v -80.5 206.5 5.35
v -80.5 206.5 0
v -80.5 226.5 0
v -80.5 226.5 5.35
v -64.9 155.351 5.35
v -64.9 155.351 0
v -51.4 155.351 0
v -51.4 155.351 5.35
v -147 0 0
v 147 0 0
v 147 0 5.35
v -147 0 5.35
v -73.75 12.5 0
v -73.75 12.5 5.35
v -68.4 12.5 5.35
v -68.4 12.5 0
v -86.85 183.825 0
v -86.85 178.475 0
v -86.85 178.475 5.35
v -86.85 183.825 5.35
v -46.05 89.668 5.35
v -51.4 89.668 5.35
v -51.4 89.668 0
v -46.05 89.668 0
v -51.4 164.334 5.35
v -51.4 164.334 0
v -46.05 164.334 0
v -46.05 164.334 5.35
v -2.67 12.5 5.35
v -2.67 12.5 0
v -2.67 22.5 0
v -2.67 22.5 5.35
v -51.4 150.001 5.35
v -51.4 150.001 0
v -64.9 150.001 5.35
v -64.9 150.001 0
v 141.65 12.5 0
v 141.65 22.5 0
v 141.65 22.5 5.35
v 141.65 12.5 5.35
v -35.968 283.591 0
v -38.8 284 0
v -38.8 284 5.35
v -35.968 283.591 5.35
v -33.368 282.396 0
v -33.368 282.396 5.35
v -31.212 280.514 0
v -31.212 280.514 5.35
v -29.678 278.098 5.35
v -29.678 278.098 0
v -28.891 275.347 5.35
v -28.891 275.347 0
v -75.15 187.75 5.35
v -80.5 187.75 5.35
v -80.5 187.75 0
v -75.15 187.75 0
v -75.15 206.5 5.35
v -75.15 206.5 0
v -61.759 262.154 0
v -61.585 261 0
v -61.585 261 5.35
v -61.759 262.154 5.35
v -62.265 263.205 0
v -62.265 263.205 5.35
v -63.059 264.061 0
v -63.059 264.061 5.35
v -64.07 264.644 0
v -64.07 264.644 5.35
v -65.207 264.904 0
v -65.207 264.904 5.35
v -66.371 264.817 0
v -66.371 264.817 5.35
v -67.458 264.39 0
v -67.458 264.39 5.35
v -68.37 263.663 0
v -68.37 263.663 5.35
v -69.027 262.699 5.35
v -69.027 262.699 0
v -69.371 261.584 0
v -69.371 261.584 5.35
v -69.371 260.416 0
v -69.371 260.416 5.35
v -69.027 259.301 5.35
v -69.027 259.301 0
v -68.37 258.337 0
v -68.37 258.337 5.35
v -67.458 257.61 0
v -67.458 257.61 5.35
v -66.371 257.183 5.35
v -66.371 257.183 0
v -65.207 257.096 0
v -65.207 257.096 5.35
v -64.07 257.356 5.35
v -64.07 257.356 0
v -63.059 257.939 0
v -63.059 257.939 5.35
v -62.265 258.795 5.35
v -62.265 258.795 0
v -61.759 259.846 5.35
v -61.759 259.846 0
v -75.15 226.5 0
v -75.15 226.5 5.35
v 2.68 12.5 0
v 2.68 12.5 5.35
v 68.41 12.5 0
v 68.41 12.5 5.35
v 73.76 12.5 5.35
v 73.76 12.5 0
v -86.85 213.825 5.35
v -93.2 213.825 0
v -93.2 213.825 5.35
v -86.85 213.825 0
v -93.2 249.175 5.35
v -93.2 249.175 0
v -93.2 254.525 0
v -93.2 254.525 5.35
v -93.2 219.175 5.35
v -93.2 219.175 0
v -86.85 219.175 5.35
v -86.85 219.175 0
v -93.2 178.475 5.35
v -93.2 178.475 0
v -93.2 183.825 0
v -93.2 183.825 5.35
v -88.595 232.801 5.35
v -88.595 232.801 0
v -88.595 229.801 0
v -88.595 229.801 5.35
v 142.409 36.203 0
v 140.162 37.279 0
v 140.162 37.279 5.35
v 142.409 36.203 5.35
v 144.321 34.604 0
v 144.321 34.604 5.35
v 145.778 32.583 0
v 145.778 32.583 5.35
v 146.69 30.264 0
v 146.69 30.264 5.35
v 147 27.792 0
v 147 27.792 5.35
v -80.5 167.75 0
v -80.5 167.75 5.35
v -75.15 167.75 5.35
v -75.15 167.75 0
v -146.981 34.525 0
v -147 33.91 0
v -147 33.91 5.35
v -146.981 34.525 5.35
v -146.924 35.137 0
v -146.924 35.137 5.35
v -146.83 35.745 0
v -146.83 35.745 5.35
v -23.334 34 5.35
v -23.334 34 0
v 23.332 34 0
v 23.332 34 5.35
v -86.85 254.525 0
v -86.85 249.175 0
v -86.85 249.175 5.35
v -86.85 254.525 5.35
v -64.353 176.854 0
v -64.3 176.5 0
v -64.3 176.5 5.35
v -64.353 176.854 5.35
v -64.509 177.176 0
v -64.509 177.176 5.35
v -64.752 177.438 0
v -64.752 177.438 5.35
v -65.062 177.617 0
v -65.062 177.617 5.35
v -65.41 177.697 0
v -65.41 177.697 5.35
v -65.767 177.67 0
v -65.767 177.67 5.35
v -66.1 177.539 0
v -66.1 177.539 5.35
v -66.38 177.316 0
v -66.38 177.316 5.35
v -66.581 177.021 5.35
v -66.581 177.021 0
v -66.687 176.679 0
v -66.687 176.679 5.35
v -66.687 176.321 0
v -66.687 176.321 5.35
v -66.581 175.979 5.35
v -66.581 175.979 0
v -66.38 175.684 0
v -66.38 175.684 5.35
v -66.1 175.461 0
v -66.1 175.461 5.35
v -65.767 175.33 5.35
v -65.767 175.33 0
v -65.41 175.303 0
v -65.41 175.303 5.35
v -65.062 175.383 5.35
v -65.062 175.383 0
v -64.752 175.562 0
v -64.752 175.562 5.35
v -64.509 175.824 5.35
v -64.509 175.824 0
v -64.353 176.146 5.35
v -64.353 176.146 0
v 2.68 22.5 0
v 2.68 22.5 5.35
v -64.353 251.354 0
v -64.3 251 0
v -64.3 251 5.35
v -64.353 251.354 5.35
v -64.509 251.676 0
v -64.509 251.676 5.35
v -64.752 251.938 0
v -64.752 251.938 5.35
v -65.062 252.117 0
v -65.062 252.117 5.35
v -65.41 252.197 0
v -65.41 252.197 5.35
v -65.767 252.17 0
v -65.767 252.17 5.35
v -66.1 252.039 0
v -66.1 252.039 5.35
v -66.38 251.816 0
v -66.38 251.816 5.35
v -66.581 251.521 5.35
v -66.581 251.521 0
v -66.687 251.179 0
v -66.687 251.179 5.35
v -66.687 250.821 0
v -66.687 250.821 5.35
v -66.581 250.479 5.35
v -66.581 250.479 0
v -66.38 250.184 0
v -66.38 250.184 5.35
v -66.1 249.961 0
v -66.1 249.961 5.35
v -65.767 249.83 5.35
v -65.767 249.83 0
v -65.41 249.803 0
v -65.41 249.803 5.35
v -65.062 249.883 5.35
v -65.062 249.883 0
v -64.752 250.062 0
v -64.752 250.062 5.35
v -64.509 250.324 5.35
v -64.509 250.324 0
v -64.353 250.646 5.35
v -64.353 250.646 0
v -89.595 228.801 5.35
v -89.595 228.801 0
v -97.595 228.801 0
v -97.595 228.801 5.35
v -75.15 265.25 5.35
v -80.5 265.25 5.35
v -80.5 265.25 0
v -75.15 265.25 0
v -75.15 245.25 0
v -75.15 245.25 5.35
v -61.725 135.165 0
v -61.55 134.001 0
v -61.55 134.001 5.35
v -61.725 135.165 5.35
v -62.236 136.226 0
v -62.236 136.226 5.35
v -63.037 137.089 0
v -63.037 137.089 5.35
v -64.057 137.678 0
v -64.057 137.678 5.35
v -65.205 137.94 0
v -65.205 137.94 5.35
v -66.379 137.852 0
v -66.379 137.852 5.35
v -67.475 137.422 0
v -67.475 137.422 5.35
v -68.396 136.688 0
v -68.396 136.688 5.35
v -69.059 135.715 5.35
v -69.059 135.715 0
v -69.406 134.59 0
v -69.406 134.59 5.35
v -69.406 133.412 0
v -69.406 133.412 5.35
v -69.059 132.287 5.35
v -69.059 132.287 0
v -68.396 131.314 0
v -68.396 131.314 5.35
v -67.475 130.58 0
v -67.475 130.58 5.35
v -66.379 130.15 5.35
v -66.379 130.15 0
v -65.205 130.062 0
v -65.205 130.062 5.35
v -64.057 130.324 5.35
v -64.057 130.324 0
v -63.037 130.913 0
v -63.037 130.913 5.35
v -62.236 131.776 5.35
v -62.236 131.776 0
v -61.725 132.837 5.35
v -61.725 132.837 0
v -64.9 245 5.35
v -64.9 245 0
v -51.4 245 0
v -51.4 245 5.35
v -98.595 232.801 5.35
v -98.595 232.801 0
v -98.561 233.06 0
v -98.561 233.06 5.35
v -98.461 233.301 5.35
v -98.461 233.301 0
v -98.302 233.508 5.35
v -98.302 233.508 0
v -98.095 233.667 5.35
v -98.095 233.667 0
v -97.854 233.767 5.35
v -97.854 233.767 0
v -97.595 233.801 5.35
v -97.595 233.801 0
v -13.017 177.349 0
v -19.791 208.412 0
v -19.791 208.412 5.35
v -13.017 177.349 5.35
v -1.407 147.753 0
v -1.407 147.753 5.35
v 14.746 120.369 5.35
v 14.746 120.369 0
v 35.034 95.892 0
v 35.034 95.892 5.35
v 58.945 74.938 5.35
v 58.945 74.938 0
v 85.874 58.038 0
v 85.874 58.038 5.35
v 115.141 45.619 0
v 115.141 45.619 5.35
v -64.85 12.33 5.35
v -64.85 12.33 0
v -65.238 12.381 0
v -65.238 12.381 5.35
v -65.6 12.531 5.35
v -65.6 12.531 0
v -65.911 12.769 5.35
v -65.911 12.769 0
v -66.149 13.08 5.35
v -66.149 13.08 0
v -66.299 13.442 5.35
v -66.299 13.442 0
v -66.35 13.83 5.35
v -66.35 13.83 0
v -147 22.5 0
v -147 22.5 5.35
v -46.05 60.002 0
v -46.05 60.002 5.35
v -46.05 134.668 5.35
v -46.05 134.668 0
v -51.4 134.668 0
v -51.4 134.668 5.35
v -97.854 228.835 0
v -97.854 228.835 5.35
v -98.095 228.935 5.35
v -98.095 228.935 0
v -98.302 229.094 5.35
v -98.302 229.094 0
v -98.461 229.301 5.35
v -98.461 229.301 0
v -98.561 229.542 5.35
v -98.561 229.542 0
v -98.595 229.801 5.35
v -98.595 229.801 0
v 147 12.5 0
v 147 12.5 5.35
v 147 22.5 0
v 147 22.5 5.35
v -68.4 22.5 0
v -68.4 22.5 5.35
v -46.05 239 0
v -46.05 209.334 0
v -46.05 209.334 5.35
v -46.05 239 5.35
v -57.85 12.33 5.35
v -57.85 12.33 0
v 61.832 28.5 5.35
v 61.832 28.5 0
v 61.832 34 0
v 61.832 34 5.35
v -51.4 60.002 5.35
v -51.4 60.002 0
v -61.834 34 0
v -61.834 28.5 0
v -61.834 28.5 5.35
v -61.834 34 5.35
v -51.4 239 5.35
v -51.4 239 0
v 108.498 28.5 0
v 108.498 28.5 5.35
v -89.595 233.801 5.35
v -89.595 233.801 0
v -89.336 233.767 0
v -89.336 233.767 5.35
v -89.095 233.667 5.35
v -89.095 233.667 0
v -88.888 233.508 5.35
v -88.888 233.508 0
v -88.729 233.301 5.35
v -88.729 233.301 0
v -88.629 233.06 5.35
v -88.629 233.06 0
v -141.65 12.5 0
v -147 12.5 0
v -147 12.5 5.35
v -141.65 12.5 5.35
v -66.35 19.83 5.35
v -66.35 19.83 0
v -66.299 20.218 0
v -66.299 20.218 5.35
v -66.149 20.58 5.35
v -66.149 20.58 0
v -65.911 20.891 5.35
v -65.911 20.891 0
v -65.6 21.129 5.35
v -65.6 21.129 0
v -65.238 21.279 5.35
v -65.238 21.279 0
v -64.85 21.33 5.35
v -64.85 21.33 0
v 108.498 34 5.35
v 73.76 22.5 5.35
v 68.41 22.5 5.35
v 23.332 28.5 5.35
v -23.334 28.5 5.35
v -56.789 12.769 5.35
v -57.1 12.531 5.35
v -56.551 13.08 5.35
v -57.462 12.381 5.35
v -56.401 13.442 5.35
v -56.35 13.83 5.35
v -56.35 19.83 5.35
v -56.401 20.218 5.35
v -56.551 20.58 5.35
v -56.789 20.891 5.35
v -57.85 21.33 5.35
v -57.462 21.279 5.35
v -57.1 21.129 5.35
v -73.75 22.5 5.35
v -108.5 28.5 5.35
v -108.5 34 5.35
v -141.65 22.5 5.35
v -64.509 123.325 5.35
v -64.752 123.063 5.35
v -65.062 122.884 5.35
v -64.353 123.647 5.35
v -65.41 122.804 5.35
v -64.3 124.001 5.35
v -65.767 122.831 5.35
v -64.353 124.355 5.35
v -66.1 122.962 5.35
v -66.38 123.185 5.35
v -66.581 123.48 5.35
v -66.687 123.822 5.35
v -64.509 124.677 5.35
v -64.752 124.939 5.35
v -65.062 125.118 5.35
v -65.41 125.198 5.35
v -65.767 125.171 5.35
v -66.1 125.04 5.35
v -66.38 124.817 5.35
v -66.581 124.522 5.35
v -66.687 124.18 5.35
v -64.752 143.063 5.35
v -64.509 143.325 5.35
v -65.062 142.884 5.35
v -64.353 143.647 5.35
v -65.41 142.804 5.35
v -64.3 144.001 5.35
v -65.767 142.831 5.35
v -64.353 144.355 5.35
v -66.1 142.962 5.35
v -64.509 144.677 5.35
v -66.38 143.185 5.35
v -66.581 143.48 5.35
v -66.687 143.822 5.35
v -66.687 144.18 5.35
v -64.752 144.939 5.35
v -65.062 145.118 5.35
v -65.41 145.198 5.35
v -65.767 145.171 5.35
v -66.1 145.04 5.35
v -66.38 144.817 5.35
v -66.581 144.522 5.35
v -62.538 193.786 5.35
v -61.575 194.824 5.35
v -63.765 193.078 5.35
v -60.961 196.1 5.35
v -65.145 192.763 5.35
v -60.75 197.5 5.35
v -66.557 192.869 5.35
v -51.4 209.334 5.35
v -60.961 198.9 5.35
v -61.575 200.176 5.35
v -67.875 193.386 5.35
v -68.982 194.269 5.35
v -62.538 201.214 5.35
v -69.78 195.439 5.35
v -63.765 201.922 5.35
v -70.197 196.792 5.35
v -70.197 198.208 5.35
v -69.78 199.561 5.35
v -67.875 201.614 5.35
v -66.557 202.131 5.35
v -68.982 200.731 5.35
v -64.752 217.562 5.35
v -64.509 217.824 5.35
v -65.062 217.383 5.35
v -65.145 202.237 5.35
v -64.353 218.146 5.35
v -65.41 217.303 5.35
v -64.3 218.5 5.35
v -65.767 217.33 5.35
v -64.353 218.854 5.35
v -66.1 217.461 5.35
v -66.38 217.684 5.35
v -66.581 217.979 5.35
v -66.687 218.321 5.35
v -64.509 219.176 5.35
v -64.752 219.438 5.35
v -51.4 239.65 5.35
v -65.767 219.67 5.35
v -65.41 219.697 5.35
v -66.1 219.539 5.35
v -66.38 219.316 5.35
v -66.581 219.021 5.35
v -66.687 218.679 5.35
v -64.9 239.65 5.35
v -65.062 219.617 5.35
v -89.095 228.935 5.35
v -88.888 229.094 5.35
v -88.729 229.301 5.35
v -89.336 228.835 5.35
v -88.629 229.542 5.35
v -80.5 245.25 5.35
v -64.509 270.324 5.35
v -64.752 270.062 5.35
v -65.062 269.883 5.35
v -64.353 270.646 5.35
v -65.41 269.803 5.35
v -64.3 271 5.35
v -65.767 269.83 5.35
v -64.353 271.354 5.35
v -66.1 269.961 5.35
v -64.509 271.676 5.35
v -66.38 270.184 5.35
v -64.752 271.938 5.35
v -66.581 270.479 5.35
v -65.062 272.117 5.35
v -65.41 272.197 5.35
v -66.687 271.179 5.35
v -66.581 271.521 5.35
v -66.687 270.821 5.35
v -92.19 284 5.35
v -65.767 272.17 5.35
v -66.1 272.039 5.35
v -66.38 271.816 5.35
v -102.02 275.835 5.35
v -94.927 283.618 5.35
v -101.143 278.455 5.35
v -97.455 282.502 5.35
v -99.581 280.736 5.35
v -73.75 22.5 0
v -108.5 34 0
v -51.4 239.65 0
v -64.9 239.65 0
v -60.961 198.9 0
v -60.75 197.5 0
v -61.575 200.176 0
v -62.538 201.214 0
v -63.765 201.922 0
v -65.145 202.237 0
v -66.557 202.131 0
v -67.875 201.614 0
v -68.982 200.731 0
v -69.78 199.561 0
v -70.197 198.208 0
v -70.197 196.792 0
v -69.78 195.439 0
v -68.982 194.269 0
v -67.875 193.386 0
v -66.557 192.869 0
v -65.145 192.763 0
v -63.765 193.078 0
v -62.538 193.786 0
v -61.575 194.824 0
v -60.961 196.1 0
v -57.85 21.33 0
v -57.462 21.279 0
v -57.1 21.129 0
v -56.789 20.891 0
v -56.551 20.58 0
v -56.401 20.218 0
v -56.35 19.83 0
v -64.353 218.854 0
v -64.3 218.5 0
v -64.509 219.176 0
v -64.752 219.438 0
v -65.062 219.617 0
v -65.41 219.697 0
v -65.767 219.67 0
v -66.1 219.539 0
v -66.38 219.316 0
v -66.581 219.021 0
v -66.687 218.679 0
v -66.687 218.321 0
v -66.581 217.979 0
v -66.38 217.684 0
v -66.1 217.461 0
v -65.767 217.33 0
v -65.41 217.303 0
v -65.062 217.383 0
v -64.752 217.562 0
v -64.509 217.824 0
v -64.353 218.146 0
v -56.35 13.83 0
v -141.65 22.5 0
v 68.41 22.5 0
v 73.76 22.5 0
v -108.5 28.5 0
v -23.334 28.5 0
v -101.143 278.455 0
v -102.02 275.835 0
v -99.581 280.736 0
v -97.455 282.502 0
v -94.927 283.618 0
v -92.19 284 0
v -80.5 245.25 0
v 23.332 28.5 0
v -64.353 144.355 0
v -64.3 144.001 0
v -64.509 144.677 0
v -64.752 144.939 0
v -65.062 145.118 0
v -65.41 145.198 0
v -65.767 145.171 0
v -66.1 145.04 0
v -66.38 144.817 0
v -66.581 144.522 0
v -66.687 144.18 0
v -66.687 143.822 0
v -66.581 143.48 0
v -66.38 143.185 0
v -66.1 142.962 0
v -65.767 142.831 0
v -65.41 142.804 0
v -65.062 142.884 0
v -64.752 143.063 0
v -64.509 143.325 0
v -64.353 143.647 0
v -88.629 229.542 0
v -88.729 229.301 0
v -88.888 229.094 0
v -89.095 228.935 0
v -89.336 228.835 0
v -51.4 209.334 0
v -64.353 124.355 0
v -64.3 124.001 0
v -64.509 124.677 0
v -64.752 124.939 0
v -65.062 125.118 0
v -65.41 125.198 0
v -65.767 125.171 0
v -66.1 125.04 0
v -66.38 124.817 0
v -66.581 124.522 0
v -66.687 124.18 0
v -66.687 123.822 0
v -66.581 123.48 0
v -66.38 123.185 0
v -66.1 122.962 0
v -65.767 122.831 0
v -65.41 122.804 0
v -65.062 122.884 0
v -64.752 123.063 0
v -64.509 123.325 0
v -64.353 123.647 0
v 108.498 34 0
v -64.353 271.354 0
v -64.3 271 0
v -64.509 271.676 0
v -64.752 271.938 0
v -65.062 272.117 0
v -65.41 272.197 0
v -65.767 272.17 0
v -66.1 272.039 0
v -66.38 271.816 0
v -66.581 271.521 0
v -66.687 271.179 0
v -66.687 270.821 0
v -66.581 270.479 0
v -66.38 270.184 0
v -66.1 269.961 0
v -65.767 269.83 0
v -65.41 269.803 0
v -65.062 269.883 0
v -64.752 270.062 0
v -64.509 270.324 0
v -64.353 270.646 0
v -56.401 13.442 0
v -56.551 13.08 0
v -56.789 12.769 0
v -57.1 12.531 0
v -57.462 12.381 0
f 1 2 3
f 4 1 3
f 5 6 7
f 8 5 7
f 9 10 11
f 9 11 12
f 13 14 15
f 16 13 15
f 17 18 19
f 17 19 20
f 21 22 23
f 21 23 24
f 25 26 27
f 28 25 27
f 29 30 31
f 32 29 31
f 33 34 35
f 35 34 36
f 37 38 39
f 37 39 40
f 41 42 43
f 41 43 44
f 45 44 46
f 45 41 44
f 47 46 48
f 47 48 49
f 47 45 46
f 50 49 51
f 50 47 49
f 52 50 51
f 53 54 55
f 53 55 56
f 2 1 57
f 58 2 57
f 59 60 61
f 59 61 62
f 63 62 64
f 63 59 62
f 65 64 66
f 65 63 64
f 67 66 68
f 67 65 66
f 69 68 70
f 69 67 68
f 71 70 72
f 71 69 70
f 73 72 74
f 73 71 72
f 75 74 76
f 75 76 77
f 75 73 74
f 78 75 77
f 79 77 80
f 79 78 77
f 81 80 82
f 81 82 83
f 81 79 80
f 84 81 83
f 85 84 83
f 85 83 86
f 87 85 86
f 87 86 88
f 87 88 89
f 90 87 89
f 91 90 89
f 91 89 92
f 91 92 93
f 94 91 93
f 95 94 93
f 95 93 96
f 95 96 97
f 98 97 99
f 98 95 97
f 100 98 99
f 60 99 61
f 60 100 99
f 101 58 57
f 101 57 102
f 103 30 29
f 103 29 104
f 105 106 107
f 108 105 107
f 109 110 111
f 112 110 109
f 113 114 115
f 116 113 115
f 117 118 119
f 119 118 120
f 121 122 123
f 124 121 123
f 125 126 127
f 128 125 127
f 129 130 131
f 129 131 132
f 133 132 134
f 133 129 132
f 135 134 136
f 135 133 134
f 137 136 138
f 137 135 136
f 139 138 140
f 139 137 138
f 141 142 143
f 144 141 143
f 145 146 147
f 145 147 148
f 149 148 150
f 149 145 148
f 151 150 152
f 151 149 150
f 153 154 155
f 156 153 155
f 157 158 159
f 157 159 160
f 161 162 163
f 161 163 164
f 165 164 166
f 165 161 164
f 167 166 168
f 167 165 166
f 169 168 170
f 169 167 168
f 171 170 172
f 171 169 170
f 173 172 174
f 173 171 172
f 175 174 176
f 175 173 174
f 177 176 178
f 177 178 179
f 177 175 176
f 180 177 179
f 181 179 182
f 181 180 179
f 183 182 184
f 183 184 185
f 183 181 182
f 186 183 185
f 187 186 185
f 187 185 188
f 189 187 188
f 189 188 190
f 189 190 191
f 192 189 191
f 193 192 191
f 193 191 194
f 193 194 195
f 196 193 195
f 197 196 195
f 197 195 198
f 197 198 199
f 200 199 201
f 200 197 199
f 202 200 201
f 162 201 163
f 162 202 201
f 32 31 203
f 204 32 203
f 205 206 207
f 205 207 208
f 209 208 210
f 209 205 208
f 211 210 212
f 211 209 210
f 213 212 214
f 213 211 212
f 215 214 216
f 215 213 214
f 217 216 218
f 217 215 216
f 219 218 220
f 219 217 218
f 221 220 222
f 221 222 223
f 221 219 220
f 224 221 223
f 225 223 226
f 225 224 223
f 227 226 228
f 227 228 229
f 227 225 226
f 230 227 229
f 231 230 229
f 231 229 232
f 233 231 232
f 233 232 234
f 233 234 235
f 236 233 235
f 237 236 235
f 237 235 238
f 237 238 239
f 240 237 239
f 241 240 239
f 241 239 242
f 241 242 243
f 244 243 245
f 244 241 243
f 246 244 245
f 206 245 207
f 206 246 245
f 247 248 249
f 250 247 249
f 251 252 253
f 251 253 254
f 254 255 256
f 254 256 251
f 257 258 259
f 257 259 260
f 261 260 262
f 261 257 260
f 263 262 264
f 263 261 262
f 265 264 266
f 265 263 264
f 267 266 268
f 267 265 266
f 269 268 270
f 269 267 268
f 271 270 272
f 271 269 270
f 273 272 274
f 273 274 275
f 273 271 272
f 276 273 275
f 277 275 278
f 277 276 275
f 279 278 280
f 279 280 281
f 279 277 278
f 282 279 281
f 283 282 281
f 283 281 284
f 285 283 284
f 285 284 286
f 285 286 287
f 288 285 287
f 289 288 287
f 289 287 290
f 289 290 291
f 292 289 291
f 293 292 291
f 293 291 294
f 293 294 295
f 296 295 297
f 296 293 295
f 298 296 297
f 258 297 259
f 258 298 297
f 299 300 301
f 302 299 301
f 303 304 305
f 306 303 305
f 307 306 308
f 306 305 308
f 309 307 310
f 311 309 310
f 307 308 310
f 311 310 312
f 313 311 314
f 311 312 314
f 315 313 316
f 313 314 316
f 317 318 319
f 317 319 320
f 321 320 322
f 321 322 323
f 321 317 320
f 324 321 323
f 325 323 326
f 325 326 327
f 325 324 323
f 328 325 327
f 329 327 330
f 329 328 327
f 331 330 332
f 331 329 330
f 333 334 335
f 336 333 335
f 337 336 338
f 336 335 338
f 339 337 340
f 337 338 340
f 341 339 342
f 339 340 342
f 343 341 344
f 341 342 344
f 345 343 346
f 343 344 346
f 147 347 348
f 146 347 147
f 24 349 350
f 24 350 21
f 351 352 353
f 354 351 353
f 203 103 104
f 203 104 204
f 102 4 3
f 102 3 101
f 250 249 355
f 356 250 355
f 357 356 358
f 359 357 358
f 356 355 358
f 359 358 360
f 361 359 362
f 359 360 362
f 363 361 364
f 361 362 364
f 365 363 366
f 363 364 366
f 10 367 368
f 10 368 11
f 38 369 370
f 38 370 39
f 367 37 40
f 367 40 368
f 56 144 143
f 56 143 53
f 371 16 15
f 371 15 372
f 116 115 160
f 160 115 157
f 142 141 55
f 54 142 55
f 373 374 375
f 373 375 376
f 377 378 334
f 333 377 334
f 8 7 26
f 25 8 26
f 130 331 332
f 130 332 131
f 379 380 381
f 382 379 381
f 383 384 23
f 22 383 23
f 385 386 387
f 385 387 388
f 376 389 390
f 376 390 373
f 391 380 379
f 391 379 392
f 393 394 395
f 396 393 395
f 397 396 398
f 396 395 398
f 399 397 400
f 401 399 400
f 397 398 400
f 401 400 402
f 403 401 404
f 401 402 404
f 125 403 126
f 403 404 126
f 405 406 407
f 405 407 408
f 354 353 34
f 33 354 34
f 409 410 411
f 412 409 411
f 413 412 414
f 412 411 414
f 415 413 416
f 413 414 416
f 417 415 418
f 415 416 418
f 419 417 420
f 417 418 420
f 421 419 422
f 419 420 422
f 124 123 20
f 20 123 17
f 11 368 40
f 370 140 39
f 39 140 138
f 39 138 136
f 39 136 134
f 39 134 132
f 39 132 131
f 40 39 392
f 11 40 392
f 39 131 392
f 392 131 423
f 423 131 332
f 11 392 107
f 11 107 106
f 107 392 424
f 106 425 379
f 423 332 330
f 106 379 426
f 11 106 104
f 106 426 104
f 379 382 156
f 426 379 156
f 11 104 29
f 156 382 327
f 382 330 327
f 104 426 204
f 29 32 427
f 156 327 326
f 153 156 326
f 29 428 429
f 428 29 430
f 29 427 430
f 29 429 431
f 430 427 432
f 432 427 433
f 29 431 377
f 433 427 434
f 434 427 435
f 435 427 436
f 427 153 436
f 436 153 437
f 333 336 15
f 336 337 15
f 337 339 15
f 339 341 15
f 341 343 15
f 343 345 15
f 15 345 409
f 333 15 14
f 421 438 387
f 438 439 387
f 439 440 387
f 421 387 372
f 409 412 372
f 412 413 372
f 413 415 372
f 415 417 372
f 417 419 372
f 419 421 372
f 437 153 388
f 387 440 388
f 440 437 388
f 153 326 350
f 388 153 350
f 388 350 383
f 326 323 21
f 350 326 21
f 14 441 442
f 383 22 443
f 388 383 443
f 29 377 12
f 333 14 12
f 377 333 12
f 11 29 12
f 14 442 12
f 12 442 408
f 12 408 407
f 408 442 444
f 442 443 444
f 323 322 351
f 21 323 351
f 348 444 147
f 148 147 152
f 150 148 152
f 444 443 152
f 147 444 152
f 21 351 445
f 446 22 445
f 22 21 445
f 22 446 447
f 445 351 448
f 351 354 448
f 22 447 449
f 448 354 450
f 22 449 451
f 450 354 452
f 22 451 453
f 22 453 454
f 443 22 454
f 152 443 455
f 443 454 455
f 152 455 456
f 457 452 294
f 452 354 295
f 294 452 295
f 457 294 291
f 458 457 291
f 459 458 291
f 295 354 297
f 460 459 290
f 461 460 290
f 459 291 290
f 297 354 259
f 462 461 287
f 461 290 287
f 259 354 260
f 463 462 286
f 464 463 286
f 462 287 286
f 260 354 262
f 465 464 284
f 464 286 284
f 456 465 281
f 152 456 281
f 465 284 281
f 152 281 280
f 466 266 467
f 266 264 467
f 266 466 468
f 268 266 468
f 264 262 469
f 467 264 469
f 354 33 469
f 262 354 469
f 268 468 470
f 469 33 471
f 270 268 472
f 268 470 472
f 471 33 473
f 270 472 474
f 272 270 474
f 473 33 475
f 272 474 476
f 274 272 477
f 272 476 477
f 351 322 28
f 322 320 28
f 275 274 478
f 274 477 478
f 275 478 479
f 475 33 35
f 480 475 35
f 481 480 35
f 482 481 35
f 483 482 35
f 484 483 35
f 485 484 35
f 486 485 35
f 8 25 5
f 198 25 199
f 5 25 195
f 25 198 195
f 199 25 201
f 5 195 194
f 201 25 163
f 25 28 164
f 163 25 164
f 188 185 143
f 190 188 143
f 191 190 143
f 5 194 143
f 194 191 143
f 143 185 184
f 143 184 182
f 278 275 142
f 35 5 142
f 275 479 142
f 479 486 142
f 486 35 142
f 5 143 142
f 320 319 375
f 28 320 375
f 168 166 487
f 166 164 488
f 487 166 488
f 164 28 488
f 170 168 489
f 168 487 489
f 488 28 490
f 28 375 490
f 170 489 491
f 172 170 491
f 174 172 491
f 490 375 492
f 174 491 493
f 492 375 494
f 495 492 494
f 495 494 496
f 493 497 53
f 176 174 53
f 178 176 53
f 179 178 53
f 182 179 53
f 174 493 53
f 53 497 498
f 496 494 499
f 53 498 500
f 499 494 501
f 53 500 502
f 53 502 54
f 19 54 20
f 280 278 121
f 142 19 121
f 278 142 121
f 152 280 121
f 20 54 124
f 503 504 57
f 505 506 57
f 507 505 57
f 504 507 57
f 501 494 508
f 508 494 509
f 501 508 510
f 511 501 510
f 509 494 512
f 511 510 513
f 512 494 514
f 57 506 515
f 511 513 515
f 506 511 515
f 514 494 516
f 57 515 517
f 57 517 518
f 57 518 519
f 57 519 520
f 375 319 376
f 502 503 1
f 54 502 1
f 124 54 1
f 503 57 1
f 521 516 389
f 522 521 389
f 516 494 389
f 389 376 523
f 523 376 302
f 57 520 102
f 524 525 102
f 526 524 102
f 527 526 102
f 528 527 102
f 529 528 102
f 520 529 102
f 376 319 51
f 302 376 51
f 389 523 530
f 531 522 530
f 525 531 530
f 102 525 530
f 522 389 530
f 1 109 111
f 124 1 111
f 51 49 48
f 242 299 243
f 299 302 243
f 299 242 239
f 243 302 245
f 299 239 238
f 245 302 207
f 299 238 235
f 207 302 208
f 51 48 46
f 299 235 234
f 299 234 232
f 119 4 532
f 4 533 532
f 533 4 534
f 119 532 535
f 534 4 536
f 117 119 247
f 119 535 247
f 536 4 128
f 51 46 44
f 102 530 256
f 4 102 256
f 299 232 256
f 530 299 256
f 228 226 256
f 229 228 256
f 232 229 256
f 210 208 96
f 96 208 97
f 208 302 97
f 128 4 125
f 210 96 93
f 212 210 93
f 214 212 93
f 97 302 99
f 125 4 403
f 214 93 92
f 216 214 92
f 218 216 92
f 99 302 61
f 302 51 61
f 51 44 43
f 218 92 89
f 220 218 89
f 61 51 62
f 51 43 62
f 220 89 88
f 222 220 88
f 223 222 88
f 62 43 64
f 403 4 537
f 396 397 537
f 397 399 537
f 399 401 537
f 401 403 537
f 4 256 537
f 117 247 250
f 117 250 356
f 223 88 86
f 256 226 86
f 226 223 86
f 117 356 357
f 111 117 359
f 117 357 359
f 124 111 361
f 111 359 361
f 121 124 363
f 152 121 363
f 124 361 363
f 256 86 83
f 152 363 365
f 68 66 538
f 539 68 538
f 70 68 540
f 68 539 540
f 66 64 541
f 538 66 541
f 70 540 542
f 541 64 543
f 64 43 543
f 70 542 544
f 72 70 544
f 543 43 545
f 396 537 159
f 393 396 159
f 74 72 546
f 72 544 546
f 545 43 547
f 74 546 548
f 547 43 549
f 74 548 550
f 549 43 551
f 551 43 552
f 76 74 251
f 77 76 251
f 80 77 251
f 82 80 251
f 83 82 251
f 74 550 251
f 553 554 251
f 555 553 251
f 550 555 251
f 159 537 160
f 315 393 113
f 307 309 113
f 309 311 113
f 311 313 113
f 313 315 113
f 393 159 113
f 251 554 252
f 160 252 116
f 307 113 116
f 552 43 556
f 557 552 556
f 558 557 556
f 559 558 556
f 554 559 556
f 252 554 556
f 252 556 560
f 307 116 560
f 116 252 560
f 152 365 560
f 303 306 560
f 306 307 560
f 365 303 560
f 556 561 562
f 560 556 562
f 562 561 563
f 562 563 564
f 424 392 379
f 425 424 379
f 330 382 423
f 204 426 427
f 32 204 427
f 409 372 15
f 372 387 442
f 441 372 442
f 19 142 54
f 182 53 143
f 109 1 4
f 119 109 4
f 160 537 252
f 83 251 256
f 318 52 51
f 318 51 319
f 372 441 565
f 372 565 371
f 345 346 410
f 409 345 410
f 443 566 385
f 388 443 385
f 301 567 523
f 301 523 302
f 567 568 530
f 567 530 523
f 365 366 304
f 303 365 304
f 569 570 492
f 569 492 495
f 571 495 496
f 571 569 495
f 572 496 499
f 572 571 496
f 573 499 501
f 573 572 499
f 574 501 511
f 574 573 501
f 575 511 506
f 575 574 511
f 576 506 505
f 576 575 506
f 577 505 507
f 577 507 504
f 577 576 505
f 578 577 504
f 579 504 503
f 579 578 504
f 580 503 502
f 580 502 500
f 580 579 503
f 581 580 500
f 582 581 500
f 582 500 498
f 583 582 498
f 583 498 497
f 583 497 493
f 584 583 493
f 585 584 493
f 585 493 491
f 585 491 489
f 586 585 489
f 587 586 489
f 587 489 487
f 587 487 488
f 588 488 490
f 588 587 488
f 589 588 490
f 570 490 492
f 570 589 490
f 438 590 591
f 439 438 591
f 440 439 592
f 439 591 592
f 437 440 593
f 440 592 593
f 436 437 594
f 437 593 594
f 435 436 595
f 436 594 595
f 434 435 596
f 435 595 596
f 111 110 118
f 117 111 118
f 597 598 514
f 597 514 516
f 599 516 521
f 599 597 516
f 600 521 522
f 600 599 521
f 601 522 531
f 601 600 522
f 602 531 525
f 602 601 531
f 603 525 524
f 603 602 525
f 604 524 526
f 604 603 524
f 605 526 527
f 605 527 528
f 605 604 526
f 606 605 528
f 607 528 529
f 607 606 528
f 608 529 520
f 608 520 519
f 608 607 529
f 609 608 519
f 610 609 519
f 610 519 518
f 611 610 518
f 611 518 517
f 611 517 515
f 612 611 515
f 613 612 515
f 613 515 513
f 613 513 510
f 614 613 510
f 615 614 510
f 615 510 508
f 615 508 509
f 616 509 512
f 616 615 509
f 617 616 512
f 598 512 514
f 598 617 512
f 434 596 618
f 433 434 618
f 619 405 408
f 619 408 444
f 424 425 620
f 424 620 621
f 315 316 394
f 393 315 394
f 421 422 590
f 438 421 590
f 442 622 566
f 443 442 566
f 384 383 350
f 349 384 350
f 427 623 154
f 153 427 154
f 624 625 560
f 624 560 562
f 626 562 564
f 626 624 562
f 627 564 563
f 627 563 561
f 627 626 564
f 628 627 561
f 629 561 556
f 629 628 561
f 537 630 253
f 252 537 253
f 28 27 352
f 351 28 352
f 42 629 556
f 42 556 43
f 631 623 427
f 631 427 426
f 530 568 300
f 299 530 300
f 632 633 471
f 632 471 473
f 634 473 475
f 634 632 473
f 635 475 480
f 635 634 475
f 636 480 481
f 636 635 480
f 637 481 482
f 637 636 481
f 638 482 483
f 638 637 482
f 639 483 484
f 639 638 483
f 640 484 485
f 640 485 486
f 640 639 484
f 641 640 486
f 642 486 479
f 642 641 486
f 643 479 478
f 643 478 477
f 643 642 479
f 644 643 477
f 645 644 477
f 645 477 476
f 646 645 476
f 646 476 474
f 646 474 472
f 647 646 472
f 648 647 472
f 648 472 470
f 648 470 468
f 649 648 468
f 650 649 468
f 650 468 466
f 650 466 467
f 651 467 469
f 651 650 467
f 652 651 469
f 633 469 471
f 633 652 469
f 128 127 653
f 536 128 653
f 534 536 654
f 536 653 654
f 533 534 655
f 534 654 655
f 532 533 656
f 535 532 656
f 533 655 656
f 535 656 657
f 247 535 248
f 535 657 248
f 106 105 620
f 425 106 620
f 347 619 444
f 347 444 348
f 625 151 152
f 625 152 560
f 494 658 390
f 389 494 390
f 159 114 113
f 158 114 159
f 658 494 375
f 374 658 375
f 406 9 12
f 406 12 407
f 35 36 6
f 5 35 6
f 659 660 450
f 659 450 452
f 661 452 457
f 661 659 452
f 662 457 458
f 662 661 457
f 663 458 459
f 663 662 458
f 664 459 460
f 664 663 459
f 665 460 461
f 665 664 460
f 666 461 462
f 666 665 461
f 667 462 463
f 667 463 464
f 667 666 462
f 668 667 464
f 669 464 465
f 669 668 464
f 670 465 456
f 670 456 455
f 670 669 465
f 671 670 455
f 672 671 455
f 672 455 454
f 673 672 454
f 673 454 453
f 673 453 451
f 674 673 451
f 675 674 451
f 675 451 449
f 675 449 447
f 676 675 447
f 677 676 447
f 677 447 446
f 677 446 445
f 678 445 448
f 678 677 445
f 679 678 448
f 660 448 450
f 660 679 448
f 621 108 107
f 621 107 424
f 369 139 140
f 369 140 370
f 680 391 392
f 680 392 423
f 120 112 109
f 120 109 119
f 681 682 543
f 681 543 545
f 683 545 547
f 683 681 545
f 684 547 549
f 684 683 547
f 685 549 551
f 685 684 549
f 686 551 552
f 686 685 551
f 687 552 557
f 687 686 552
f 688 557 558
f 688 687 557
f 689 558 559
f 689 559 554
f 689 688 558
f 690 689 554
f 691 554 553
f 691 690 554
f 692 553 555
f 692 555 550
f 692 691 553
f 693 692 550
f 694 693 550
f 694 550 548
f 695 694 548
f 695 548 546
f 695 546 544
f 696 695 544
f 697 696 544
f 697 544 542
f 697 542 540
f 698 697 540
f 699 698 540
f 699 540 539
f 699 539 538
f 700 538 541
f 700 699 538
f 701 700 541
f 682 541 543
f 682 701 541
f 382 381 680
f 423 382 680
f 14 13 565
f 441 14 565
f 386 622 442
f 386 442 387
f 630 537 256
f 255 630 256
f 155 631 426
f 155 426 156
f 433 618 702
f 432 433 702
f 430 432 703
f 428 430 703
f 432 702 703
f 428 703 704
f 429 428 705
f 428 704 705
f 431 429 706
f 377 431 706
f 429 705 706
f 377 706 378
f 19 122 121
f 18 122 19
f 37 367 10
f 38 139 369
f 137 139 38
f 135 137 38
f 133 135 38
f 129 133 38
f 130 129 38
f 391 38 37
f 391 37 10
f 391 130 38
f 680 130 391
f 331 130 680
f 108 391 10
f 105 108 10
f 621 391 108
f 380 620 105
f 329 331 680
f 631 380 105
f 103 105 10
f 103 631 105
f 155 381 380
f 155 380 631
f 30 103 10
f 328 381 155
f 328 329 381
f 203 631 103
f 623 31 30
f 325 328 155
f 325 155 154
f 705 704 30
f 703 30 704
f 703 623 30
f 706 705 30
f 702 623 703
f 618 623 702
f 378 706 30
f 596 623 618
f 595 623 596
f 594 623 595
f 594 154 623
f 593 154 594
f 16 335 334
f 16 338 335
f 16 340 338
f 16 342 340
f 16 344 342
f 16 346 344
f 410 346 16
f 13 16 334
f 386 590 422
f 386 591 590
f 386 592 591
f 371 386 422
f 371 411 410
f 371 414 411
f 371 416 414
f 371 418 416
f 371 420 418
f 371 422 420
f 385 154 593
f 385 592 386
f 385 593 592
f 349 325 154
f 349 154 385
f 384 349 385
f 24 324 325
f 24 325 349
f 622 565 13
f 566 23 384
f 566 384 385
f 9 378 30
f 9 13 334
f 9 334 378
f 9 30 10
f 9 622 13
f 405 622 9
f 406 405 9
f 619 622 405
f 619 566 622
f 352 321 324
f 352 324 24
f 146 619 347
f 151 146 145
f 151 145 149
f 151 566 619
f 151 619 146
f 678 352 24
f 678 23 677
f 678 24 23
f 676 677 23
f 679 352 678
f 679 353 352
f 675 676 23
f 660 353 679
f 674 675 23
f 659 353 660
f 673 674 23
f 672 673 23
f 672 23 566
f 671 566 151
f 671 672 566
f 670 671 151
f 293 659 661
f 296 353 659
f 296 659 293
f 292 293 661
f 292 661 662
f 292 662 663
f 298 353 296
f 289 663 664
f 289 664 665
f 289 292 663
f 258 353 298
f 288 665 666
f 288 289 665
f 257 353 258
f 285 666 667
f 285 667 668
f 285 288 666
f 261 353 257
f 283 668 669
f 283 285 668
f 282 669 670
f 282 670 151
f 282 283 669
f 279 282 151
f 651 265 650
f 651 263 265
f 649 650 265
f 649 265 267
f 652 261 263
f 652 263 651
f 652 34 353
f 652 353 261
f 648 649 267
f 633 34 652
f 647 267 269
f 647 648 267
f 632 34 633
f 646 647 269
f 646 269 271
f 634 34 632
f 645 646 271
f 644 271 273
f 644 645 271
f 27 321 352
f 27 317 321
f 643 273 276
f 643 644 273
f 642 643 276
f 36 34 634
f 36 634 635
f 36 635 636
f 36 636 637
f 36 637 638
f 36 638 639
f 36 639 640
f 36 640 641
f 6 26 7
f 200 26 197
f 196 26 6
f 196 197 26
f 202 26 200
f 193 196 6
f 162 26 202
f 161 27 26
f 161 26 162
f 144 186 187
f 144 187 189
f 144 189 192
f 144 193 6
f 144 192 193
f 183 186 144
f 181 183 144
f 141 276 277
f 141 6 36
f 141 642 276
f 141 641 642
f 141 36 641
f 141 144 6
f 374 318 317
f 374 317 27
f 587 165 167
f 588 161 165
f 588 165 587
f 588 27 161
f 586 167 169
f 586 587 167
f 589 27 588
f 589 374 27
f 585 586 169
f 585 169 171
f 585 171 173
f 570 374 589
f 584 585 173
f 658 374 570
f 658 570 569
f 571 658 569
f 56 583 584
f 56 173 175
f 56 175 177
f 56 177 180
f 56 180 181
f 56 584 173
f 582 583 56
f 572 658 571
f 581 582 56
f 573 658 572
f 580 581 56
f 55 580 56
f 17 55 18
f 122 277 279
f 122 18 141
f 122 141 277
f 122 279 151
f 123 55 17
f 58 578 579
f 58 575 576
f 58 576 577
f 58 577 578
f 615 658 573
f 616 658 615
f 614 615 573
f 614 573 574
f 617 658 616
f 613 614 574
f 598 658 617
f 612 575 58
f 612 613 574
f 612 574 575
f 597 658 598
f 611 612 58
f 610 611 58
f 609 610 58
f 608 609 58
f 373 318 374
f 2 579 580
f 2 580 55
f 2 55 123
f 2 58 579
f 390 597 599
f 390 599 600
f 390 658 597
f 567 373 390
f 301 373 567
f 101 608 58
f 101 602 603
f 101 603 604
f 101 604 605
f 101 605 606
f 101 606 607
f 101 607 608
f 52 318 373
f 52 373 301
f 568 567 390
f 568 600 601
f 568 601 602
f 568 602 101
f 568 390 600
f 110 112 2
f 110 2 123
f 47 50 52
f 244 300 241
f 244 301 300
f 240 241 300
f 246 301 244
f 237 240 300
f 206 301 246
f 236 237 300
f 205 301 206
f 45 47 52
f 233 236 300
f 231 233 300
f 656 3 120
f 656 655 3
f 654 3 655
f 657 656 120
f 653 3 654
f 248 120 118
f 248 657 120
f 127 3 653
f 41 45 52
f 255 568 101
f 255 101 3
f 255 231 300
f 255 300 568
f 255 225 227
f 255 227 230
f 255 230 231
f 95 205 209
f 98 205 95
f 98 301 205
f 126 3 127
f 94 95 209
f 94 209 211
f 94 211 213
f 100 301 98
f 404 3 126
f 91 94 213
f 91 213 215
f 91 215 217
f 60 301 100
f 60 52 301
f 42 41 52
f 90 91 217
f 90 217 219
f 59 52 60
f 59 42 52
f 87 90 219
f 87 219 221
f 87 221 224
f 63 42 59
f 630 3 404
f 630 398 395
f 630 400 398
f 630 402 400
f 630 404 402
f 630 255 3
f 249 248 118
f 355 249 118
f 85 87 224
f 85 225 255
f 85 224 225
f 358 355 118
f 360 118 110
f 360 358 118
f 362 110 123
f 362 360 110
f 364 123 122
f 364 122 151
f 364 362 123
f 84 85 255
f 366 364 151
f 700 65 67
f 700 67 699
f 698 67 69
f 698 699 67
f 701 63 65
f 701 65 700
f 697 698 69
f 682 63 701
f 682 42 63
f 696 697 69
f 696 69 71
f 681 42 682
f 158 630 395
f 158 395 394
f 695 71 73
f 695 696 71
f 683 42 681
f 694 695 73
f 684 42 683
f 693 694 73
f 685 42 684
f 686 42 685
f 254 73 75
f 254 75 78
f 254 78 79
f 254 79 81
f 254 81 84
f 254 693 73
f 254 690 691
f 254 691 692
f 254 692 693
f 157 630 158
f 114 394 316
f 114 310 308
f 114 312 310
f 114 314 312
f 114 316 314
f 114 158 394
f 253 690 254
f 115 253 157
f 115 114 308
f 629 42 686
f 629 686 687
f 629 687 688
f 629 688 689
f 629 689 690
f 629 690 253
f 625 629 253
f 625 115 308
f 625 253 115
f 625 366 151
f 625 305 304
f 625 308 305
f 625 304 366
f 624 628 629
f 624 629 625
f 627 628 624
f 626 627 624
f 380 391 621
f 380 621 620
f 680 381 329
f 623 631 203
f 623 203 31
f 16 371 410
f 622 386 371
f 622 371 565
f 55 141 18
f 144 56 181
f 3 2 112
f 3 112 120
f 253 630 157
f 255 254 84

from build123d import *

# Parameters (mm, degrees)
MODEL_R             = 3.915
MODEL_R_2           = 1.2
MODEL_R_3           = 4.75
MODEL_R_4           = 3.95
MODEL_W             = 46.666
MODEL_H             = 5.5
MODEL_W_2           = 5.35
MODEL_H_2           = 10
MODEL_W_3           = 6.35
MODEL_H_3           = 5.35
MODEL_H_4           = 20
MODEL_H_5           = 29.666
MODEL_W_4           = 13.5
BOSS_EXTRUDE1_DEPTH = 5.35


with BuildPart() as part:
    # Model → Boss-Extrude1 (new body)
    with BuildSketch(Plane.XY):
        with BuildLine():
            Line((-147, 22.5), (-147, 33.91))
            ThreePointArc((-147, 33.91), (-146.957472748, 34.831268946), (-146.830252706, 35.744702086))
            Line((-146.830252706, 35.744702086), (-102.020252706, 275.834702086))
            ThreePointArc((-102.020252706, 275.834702086), (-98.579560984, 281.692432023), (-92.19, 284))
            Line((-92.19, 284), (-38.8, 284))
            ThreePointArc((-38.8, 284), (-32.222459634, 281.532327843), (-28.891161913, 275.347192548))
            Line((-28.891161913, 275.347192548), (-19.790761745, 208.412149045))
            ThreePointArc((-19.790761745, 208.412149045), (24.403039643, 107.726661994), (115.140729145, 45.619246274))
            Line((115.140729145, 45.619246274), (140.162263543, 37.27877618))
            ThreePointArc((140.162263543, 37.27877618), (145.112417501, 33.639047376), (147, 27.791938494))
            Line((147, 27.791938494), (147, 22.5))
            Line((147, 22.5), (141.65, 22.5))
            Line((141.65, 22.5), (141.65, 12.5))
            Line((141.65, 12.5), (147, 12.5))
            Line((147, 12.5), (147, 0))
            Line((147, 0), (-147, 0))
            Line((-147, 0), (-147, 12.5))
            Line((-147, 12.5), (-141.65, 12.5))
            Line((-141.65, 12.5), (-141.65, 22.5))
            Line((-141.65, 22.5), (-147, 22.5))
        make_face()
        with Locations((-65.5, 261)):
            Circle(MODEL_R, mode=Mode.SUBTRACT)
        with Locations((-65.5, 271)):
            Circle(MODEL_R_2, mode=Mode.SUBTRACT)
        with Locations((-65.5, 251)):
            Circle(MODEL_R_2, mode=Mode.SUBTRACT)
        with Locations((-65.5, 197.5)):
            Circle(MODEL_R_3, mode=Mode.SUBTRACT)
        with Locations((-65.5, 218.5)):
            Circle(MODEL_R_2, mode=Mode.SUBTRACT)
        with Locations((-65.5, 176.5)):
            Circle(MODEL_R_2, mode=Mode.SUBTRACT)
        with Locations((-65.5, 134.001)):
            Circle(MODEL_R_4, mode=Mode.SUBTRACT)
        with Locations((-65.5, 144.001)):
            Circle(MODEL_R_2, mode=Mode.SUBTRACT)
        with Locations((-65.5, 124.001)):
            Circle(MODEL_R_2, mode=Mode.SUBTRACT)
        with Locations((-0.001, 31.25)):
            Rectangle(MODEL_W, MODEL_H, mode=Mode.SUBTRACT)
        with Locations((-85.167, 31.25)):
            Rectangle(MODEL_W, MODEL_H, mode=Mode.SUBTRACT)
        with Locations((85.165, 31.25)):
            Rectangle(MODEL_W, MODEL_H, mode=Mode.SUBTRACT)
        with Locations((0.005, 17.5)):
            Rectangle(MODEL_W_2, MODEL_H_2, mode=Mode.SUBTRACT)
        with Locations((-71.075, 17.5)):
            Rectangle(MODEL_W_2, MODEL_H_2, mode=Mode.SUBTRACT)
        with Locations((71.085, 17.5)):
            Rectangle(MODEL_W_2, MODEL_H_2, mode=Mode.SUBTRACT)
        with Locations((-90.025, 216.5)):
            Rectangle(MODEL_W_3, MODEL_H_3, mode=Mode.SUBTRACT)
        with BuildLine():
            Line((-64.85, 21.33), (-57.85, 21.33))
            ThreePointArc((-57.85, 21.33), (-56.789339828, 20.890660172), (-56.35, 19.83))
            Line((-56.35, 19.83), (-56.35, 13.83))
            ThreePointArc((-56.35, 13.83), (-56.789339828, 12.769339828), (-57.85, 12.33))
            Line((-57.85, 12.33), (-64.85, 12.33))
            ThreePointArc((-64.85, 12.33), (-65.910660172, 12.769339828), (-66.35, 13.83))
            Line((-66.35, 13.83), (-66.35, 19.83))
            ThreePointArc((-66.35, 19.83), (-65.910660172, 20.890660172), (-64.85, 21.33))
        make_face(mode=Mode.SUBTRACT)
        with Locations((-90.025, 251.85)):
            Rectangle(MODEL_W_3, MODEL_H_3, mode=Mode.SUBTRACT)
        with Locations((-90.025, 181.15)):
            Rectangle(MODEL_W_3, MODEL_H_3, mode=Mode.SUBTRACT)
        with Locations((-77.825, 216.5)):
            Rectangle(MODEL_W_2, MODEL_H_4, mode=Mode.SUBTRACT)
        with Locations((-77.825, 255.25)):
            Rectangle(MODEL_W_2, MODEL_H_4, mode=Mode.SUBTRACT)
        with Locations((-77.825, 177.75)):
            Rectangle(MODEL_W_2, MODEL_H_4, mode=Mode.SUBTRACT)
        Polygon((-51.4, 164.334), (-46.05, 164.334), (-46.05, 134.668), (-51.4, 134.668), (-51.4, 150.001), (-64.9, 150.001), (-64.9, 155.351), (-51.4, 155.351), align=None, mode=Mode.SUBTRACT)
        with BuildLine():
            Line((-89.595, 228.801), (-97.595, 228.801))
            ThreePointArc((-97.595, 228.801), (-98.302106781, 229.093893219), (-98.595, 229.801))
            Line((-98.595, 229.801), (-98.595, 232.801))
            ThreePointArc((-98.595, 232.801), (-98.302106781, 233.508106781), (-97.595, 233.801))
            Line((-97.595, 233.801), (-89.595, 233.801))
            ThreePointArc((-89.595, 233.801), (-88.887893219, 233.508106781), (-88.595, 232.801))
            Line((-88.595, 232.801), (-88.595, 229.801))
            ThreePointArc((-88.595, 229.801), (-88.887893219, 229.093893219), (-89.595, 228.801))
        make_face(mode=Mode.SUBTRACT)
        with Locations((-48.725, 224.167)):
            Rectangle(MODEL_W_2, MODEL_H_5, mode=Mode.SUBTRACT)
        with Locations((-48.725, 74.835)):
            Rectangle(MODEL_W_2, MODEL_H_5, mode=Mode.SUBTRACT)
        with Locations((-58.15, 242.325)):
            Rectangle(MODEL_W_4, MODEL_H_3, mode=Mode.SUBTRACT)
    extrude(amount=BOSS_EXTRUDE1_DEPTH)


solid = part.part
